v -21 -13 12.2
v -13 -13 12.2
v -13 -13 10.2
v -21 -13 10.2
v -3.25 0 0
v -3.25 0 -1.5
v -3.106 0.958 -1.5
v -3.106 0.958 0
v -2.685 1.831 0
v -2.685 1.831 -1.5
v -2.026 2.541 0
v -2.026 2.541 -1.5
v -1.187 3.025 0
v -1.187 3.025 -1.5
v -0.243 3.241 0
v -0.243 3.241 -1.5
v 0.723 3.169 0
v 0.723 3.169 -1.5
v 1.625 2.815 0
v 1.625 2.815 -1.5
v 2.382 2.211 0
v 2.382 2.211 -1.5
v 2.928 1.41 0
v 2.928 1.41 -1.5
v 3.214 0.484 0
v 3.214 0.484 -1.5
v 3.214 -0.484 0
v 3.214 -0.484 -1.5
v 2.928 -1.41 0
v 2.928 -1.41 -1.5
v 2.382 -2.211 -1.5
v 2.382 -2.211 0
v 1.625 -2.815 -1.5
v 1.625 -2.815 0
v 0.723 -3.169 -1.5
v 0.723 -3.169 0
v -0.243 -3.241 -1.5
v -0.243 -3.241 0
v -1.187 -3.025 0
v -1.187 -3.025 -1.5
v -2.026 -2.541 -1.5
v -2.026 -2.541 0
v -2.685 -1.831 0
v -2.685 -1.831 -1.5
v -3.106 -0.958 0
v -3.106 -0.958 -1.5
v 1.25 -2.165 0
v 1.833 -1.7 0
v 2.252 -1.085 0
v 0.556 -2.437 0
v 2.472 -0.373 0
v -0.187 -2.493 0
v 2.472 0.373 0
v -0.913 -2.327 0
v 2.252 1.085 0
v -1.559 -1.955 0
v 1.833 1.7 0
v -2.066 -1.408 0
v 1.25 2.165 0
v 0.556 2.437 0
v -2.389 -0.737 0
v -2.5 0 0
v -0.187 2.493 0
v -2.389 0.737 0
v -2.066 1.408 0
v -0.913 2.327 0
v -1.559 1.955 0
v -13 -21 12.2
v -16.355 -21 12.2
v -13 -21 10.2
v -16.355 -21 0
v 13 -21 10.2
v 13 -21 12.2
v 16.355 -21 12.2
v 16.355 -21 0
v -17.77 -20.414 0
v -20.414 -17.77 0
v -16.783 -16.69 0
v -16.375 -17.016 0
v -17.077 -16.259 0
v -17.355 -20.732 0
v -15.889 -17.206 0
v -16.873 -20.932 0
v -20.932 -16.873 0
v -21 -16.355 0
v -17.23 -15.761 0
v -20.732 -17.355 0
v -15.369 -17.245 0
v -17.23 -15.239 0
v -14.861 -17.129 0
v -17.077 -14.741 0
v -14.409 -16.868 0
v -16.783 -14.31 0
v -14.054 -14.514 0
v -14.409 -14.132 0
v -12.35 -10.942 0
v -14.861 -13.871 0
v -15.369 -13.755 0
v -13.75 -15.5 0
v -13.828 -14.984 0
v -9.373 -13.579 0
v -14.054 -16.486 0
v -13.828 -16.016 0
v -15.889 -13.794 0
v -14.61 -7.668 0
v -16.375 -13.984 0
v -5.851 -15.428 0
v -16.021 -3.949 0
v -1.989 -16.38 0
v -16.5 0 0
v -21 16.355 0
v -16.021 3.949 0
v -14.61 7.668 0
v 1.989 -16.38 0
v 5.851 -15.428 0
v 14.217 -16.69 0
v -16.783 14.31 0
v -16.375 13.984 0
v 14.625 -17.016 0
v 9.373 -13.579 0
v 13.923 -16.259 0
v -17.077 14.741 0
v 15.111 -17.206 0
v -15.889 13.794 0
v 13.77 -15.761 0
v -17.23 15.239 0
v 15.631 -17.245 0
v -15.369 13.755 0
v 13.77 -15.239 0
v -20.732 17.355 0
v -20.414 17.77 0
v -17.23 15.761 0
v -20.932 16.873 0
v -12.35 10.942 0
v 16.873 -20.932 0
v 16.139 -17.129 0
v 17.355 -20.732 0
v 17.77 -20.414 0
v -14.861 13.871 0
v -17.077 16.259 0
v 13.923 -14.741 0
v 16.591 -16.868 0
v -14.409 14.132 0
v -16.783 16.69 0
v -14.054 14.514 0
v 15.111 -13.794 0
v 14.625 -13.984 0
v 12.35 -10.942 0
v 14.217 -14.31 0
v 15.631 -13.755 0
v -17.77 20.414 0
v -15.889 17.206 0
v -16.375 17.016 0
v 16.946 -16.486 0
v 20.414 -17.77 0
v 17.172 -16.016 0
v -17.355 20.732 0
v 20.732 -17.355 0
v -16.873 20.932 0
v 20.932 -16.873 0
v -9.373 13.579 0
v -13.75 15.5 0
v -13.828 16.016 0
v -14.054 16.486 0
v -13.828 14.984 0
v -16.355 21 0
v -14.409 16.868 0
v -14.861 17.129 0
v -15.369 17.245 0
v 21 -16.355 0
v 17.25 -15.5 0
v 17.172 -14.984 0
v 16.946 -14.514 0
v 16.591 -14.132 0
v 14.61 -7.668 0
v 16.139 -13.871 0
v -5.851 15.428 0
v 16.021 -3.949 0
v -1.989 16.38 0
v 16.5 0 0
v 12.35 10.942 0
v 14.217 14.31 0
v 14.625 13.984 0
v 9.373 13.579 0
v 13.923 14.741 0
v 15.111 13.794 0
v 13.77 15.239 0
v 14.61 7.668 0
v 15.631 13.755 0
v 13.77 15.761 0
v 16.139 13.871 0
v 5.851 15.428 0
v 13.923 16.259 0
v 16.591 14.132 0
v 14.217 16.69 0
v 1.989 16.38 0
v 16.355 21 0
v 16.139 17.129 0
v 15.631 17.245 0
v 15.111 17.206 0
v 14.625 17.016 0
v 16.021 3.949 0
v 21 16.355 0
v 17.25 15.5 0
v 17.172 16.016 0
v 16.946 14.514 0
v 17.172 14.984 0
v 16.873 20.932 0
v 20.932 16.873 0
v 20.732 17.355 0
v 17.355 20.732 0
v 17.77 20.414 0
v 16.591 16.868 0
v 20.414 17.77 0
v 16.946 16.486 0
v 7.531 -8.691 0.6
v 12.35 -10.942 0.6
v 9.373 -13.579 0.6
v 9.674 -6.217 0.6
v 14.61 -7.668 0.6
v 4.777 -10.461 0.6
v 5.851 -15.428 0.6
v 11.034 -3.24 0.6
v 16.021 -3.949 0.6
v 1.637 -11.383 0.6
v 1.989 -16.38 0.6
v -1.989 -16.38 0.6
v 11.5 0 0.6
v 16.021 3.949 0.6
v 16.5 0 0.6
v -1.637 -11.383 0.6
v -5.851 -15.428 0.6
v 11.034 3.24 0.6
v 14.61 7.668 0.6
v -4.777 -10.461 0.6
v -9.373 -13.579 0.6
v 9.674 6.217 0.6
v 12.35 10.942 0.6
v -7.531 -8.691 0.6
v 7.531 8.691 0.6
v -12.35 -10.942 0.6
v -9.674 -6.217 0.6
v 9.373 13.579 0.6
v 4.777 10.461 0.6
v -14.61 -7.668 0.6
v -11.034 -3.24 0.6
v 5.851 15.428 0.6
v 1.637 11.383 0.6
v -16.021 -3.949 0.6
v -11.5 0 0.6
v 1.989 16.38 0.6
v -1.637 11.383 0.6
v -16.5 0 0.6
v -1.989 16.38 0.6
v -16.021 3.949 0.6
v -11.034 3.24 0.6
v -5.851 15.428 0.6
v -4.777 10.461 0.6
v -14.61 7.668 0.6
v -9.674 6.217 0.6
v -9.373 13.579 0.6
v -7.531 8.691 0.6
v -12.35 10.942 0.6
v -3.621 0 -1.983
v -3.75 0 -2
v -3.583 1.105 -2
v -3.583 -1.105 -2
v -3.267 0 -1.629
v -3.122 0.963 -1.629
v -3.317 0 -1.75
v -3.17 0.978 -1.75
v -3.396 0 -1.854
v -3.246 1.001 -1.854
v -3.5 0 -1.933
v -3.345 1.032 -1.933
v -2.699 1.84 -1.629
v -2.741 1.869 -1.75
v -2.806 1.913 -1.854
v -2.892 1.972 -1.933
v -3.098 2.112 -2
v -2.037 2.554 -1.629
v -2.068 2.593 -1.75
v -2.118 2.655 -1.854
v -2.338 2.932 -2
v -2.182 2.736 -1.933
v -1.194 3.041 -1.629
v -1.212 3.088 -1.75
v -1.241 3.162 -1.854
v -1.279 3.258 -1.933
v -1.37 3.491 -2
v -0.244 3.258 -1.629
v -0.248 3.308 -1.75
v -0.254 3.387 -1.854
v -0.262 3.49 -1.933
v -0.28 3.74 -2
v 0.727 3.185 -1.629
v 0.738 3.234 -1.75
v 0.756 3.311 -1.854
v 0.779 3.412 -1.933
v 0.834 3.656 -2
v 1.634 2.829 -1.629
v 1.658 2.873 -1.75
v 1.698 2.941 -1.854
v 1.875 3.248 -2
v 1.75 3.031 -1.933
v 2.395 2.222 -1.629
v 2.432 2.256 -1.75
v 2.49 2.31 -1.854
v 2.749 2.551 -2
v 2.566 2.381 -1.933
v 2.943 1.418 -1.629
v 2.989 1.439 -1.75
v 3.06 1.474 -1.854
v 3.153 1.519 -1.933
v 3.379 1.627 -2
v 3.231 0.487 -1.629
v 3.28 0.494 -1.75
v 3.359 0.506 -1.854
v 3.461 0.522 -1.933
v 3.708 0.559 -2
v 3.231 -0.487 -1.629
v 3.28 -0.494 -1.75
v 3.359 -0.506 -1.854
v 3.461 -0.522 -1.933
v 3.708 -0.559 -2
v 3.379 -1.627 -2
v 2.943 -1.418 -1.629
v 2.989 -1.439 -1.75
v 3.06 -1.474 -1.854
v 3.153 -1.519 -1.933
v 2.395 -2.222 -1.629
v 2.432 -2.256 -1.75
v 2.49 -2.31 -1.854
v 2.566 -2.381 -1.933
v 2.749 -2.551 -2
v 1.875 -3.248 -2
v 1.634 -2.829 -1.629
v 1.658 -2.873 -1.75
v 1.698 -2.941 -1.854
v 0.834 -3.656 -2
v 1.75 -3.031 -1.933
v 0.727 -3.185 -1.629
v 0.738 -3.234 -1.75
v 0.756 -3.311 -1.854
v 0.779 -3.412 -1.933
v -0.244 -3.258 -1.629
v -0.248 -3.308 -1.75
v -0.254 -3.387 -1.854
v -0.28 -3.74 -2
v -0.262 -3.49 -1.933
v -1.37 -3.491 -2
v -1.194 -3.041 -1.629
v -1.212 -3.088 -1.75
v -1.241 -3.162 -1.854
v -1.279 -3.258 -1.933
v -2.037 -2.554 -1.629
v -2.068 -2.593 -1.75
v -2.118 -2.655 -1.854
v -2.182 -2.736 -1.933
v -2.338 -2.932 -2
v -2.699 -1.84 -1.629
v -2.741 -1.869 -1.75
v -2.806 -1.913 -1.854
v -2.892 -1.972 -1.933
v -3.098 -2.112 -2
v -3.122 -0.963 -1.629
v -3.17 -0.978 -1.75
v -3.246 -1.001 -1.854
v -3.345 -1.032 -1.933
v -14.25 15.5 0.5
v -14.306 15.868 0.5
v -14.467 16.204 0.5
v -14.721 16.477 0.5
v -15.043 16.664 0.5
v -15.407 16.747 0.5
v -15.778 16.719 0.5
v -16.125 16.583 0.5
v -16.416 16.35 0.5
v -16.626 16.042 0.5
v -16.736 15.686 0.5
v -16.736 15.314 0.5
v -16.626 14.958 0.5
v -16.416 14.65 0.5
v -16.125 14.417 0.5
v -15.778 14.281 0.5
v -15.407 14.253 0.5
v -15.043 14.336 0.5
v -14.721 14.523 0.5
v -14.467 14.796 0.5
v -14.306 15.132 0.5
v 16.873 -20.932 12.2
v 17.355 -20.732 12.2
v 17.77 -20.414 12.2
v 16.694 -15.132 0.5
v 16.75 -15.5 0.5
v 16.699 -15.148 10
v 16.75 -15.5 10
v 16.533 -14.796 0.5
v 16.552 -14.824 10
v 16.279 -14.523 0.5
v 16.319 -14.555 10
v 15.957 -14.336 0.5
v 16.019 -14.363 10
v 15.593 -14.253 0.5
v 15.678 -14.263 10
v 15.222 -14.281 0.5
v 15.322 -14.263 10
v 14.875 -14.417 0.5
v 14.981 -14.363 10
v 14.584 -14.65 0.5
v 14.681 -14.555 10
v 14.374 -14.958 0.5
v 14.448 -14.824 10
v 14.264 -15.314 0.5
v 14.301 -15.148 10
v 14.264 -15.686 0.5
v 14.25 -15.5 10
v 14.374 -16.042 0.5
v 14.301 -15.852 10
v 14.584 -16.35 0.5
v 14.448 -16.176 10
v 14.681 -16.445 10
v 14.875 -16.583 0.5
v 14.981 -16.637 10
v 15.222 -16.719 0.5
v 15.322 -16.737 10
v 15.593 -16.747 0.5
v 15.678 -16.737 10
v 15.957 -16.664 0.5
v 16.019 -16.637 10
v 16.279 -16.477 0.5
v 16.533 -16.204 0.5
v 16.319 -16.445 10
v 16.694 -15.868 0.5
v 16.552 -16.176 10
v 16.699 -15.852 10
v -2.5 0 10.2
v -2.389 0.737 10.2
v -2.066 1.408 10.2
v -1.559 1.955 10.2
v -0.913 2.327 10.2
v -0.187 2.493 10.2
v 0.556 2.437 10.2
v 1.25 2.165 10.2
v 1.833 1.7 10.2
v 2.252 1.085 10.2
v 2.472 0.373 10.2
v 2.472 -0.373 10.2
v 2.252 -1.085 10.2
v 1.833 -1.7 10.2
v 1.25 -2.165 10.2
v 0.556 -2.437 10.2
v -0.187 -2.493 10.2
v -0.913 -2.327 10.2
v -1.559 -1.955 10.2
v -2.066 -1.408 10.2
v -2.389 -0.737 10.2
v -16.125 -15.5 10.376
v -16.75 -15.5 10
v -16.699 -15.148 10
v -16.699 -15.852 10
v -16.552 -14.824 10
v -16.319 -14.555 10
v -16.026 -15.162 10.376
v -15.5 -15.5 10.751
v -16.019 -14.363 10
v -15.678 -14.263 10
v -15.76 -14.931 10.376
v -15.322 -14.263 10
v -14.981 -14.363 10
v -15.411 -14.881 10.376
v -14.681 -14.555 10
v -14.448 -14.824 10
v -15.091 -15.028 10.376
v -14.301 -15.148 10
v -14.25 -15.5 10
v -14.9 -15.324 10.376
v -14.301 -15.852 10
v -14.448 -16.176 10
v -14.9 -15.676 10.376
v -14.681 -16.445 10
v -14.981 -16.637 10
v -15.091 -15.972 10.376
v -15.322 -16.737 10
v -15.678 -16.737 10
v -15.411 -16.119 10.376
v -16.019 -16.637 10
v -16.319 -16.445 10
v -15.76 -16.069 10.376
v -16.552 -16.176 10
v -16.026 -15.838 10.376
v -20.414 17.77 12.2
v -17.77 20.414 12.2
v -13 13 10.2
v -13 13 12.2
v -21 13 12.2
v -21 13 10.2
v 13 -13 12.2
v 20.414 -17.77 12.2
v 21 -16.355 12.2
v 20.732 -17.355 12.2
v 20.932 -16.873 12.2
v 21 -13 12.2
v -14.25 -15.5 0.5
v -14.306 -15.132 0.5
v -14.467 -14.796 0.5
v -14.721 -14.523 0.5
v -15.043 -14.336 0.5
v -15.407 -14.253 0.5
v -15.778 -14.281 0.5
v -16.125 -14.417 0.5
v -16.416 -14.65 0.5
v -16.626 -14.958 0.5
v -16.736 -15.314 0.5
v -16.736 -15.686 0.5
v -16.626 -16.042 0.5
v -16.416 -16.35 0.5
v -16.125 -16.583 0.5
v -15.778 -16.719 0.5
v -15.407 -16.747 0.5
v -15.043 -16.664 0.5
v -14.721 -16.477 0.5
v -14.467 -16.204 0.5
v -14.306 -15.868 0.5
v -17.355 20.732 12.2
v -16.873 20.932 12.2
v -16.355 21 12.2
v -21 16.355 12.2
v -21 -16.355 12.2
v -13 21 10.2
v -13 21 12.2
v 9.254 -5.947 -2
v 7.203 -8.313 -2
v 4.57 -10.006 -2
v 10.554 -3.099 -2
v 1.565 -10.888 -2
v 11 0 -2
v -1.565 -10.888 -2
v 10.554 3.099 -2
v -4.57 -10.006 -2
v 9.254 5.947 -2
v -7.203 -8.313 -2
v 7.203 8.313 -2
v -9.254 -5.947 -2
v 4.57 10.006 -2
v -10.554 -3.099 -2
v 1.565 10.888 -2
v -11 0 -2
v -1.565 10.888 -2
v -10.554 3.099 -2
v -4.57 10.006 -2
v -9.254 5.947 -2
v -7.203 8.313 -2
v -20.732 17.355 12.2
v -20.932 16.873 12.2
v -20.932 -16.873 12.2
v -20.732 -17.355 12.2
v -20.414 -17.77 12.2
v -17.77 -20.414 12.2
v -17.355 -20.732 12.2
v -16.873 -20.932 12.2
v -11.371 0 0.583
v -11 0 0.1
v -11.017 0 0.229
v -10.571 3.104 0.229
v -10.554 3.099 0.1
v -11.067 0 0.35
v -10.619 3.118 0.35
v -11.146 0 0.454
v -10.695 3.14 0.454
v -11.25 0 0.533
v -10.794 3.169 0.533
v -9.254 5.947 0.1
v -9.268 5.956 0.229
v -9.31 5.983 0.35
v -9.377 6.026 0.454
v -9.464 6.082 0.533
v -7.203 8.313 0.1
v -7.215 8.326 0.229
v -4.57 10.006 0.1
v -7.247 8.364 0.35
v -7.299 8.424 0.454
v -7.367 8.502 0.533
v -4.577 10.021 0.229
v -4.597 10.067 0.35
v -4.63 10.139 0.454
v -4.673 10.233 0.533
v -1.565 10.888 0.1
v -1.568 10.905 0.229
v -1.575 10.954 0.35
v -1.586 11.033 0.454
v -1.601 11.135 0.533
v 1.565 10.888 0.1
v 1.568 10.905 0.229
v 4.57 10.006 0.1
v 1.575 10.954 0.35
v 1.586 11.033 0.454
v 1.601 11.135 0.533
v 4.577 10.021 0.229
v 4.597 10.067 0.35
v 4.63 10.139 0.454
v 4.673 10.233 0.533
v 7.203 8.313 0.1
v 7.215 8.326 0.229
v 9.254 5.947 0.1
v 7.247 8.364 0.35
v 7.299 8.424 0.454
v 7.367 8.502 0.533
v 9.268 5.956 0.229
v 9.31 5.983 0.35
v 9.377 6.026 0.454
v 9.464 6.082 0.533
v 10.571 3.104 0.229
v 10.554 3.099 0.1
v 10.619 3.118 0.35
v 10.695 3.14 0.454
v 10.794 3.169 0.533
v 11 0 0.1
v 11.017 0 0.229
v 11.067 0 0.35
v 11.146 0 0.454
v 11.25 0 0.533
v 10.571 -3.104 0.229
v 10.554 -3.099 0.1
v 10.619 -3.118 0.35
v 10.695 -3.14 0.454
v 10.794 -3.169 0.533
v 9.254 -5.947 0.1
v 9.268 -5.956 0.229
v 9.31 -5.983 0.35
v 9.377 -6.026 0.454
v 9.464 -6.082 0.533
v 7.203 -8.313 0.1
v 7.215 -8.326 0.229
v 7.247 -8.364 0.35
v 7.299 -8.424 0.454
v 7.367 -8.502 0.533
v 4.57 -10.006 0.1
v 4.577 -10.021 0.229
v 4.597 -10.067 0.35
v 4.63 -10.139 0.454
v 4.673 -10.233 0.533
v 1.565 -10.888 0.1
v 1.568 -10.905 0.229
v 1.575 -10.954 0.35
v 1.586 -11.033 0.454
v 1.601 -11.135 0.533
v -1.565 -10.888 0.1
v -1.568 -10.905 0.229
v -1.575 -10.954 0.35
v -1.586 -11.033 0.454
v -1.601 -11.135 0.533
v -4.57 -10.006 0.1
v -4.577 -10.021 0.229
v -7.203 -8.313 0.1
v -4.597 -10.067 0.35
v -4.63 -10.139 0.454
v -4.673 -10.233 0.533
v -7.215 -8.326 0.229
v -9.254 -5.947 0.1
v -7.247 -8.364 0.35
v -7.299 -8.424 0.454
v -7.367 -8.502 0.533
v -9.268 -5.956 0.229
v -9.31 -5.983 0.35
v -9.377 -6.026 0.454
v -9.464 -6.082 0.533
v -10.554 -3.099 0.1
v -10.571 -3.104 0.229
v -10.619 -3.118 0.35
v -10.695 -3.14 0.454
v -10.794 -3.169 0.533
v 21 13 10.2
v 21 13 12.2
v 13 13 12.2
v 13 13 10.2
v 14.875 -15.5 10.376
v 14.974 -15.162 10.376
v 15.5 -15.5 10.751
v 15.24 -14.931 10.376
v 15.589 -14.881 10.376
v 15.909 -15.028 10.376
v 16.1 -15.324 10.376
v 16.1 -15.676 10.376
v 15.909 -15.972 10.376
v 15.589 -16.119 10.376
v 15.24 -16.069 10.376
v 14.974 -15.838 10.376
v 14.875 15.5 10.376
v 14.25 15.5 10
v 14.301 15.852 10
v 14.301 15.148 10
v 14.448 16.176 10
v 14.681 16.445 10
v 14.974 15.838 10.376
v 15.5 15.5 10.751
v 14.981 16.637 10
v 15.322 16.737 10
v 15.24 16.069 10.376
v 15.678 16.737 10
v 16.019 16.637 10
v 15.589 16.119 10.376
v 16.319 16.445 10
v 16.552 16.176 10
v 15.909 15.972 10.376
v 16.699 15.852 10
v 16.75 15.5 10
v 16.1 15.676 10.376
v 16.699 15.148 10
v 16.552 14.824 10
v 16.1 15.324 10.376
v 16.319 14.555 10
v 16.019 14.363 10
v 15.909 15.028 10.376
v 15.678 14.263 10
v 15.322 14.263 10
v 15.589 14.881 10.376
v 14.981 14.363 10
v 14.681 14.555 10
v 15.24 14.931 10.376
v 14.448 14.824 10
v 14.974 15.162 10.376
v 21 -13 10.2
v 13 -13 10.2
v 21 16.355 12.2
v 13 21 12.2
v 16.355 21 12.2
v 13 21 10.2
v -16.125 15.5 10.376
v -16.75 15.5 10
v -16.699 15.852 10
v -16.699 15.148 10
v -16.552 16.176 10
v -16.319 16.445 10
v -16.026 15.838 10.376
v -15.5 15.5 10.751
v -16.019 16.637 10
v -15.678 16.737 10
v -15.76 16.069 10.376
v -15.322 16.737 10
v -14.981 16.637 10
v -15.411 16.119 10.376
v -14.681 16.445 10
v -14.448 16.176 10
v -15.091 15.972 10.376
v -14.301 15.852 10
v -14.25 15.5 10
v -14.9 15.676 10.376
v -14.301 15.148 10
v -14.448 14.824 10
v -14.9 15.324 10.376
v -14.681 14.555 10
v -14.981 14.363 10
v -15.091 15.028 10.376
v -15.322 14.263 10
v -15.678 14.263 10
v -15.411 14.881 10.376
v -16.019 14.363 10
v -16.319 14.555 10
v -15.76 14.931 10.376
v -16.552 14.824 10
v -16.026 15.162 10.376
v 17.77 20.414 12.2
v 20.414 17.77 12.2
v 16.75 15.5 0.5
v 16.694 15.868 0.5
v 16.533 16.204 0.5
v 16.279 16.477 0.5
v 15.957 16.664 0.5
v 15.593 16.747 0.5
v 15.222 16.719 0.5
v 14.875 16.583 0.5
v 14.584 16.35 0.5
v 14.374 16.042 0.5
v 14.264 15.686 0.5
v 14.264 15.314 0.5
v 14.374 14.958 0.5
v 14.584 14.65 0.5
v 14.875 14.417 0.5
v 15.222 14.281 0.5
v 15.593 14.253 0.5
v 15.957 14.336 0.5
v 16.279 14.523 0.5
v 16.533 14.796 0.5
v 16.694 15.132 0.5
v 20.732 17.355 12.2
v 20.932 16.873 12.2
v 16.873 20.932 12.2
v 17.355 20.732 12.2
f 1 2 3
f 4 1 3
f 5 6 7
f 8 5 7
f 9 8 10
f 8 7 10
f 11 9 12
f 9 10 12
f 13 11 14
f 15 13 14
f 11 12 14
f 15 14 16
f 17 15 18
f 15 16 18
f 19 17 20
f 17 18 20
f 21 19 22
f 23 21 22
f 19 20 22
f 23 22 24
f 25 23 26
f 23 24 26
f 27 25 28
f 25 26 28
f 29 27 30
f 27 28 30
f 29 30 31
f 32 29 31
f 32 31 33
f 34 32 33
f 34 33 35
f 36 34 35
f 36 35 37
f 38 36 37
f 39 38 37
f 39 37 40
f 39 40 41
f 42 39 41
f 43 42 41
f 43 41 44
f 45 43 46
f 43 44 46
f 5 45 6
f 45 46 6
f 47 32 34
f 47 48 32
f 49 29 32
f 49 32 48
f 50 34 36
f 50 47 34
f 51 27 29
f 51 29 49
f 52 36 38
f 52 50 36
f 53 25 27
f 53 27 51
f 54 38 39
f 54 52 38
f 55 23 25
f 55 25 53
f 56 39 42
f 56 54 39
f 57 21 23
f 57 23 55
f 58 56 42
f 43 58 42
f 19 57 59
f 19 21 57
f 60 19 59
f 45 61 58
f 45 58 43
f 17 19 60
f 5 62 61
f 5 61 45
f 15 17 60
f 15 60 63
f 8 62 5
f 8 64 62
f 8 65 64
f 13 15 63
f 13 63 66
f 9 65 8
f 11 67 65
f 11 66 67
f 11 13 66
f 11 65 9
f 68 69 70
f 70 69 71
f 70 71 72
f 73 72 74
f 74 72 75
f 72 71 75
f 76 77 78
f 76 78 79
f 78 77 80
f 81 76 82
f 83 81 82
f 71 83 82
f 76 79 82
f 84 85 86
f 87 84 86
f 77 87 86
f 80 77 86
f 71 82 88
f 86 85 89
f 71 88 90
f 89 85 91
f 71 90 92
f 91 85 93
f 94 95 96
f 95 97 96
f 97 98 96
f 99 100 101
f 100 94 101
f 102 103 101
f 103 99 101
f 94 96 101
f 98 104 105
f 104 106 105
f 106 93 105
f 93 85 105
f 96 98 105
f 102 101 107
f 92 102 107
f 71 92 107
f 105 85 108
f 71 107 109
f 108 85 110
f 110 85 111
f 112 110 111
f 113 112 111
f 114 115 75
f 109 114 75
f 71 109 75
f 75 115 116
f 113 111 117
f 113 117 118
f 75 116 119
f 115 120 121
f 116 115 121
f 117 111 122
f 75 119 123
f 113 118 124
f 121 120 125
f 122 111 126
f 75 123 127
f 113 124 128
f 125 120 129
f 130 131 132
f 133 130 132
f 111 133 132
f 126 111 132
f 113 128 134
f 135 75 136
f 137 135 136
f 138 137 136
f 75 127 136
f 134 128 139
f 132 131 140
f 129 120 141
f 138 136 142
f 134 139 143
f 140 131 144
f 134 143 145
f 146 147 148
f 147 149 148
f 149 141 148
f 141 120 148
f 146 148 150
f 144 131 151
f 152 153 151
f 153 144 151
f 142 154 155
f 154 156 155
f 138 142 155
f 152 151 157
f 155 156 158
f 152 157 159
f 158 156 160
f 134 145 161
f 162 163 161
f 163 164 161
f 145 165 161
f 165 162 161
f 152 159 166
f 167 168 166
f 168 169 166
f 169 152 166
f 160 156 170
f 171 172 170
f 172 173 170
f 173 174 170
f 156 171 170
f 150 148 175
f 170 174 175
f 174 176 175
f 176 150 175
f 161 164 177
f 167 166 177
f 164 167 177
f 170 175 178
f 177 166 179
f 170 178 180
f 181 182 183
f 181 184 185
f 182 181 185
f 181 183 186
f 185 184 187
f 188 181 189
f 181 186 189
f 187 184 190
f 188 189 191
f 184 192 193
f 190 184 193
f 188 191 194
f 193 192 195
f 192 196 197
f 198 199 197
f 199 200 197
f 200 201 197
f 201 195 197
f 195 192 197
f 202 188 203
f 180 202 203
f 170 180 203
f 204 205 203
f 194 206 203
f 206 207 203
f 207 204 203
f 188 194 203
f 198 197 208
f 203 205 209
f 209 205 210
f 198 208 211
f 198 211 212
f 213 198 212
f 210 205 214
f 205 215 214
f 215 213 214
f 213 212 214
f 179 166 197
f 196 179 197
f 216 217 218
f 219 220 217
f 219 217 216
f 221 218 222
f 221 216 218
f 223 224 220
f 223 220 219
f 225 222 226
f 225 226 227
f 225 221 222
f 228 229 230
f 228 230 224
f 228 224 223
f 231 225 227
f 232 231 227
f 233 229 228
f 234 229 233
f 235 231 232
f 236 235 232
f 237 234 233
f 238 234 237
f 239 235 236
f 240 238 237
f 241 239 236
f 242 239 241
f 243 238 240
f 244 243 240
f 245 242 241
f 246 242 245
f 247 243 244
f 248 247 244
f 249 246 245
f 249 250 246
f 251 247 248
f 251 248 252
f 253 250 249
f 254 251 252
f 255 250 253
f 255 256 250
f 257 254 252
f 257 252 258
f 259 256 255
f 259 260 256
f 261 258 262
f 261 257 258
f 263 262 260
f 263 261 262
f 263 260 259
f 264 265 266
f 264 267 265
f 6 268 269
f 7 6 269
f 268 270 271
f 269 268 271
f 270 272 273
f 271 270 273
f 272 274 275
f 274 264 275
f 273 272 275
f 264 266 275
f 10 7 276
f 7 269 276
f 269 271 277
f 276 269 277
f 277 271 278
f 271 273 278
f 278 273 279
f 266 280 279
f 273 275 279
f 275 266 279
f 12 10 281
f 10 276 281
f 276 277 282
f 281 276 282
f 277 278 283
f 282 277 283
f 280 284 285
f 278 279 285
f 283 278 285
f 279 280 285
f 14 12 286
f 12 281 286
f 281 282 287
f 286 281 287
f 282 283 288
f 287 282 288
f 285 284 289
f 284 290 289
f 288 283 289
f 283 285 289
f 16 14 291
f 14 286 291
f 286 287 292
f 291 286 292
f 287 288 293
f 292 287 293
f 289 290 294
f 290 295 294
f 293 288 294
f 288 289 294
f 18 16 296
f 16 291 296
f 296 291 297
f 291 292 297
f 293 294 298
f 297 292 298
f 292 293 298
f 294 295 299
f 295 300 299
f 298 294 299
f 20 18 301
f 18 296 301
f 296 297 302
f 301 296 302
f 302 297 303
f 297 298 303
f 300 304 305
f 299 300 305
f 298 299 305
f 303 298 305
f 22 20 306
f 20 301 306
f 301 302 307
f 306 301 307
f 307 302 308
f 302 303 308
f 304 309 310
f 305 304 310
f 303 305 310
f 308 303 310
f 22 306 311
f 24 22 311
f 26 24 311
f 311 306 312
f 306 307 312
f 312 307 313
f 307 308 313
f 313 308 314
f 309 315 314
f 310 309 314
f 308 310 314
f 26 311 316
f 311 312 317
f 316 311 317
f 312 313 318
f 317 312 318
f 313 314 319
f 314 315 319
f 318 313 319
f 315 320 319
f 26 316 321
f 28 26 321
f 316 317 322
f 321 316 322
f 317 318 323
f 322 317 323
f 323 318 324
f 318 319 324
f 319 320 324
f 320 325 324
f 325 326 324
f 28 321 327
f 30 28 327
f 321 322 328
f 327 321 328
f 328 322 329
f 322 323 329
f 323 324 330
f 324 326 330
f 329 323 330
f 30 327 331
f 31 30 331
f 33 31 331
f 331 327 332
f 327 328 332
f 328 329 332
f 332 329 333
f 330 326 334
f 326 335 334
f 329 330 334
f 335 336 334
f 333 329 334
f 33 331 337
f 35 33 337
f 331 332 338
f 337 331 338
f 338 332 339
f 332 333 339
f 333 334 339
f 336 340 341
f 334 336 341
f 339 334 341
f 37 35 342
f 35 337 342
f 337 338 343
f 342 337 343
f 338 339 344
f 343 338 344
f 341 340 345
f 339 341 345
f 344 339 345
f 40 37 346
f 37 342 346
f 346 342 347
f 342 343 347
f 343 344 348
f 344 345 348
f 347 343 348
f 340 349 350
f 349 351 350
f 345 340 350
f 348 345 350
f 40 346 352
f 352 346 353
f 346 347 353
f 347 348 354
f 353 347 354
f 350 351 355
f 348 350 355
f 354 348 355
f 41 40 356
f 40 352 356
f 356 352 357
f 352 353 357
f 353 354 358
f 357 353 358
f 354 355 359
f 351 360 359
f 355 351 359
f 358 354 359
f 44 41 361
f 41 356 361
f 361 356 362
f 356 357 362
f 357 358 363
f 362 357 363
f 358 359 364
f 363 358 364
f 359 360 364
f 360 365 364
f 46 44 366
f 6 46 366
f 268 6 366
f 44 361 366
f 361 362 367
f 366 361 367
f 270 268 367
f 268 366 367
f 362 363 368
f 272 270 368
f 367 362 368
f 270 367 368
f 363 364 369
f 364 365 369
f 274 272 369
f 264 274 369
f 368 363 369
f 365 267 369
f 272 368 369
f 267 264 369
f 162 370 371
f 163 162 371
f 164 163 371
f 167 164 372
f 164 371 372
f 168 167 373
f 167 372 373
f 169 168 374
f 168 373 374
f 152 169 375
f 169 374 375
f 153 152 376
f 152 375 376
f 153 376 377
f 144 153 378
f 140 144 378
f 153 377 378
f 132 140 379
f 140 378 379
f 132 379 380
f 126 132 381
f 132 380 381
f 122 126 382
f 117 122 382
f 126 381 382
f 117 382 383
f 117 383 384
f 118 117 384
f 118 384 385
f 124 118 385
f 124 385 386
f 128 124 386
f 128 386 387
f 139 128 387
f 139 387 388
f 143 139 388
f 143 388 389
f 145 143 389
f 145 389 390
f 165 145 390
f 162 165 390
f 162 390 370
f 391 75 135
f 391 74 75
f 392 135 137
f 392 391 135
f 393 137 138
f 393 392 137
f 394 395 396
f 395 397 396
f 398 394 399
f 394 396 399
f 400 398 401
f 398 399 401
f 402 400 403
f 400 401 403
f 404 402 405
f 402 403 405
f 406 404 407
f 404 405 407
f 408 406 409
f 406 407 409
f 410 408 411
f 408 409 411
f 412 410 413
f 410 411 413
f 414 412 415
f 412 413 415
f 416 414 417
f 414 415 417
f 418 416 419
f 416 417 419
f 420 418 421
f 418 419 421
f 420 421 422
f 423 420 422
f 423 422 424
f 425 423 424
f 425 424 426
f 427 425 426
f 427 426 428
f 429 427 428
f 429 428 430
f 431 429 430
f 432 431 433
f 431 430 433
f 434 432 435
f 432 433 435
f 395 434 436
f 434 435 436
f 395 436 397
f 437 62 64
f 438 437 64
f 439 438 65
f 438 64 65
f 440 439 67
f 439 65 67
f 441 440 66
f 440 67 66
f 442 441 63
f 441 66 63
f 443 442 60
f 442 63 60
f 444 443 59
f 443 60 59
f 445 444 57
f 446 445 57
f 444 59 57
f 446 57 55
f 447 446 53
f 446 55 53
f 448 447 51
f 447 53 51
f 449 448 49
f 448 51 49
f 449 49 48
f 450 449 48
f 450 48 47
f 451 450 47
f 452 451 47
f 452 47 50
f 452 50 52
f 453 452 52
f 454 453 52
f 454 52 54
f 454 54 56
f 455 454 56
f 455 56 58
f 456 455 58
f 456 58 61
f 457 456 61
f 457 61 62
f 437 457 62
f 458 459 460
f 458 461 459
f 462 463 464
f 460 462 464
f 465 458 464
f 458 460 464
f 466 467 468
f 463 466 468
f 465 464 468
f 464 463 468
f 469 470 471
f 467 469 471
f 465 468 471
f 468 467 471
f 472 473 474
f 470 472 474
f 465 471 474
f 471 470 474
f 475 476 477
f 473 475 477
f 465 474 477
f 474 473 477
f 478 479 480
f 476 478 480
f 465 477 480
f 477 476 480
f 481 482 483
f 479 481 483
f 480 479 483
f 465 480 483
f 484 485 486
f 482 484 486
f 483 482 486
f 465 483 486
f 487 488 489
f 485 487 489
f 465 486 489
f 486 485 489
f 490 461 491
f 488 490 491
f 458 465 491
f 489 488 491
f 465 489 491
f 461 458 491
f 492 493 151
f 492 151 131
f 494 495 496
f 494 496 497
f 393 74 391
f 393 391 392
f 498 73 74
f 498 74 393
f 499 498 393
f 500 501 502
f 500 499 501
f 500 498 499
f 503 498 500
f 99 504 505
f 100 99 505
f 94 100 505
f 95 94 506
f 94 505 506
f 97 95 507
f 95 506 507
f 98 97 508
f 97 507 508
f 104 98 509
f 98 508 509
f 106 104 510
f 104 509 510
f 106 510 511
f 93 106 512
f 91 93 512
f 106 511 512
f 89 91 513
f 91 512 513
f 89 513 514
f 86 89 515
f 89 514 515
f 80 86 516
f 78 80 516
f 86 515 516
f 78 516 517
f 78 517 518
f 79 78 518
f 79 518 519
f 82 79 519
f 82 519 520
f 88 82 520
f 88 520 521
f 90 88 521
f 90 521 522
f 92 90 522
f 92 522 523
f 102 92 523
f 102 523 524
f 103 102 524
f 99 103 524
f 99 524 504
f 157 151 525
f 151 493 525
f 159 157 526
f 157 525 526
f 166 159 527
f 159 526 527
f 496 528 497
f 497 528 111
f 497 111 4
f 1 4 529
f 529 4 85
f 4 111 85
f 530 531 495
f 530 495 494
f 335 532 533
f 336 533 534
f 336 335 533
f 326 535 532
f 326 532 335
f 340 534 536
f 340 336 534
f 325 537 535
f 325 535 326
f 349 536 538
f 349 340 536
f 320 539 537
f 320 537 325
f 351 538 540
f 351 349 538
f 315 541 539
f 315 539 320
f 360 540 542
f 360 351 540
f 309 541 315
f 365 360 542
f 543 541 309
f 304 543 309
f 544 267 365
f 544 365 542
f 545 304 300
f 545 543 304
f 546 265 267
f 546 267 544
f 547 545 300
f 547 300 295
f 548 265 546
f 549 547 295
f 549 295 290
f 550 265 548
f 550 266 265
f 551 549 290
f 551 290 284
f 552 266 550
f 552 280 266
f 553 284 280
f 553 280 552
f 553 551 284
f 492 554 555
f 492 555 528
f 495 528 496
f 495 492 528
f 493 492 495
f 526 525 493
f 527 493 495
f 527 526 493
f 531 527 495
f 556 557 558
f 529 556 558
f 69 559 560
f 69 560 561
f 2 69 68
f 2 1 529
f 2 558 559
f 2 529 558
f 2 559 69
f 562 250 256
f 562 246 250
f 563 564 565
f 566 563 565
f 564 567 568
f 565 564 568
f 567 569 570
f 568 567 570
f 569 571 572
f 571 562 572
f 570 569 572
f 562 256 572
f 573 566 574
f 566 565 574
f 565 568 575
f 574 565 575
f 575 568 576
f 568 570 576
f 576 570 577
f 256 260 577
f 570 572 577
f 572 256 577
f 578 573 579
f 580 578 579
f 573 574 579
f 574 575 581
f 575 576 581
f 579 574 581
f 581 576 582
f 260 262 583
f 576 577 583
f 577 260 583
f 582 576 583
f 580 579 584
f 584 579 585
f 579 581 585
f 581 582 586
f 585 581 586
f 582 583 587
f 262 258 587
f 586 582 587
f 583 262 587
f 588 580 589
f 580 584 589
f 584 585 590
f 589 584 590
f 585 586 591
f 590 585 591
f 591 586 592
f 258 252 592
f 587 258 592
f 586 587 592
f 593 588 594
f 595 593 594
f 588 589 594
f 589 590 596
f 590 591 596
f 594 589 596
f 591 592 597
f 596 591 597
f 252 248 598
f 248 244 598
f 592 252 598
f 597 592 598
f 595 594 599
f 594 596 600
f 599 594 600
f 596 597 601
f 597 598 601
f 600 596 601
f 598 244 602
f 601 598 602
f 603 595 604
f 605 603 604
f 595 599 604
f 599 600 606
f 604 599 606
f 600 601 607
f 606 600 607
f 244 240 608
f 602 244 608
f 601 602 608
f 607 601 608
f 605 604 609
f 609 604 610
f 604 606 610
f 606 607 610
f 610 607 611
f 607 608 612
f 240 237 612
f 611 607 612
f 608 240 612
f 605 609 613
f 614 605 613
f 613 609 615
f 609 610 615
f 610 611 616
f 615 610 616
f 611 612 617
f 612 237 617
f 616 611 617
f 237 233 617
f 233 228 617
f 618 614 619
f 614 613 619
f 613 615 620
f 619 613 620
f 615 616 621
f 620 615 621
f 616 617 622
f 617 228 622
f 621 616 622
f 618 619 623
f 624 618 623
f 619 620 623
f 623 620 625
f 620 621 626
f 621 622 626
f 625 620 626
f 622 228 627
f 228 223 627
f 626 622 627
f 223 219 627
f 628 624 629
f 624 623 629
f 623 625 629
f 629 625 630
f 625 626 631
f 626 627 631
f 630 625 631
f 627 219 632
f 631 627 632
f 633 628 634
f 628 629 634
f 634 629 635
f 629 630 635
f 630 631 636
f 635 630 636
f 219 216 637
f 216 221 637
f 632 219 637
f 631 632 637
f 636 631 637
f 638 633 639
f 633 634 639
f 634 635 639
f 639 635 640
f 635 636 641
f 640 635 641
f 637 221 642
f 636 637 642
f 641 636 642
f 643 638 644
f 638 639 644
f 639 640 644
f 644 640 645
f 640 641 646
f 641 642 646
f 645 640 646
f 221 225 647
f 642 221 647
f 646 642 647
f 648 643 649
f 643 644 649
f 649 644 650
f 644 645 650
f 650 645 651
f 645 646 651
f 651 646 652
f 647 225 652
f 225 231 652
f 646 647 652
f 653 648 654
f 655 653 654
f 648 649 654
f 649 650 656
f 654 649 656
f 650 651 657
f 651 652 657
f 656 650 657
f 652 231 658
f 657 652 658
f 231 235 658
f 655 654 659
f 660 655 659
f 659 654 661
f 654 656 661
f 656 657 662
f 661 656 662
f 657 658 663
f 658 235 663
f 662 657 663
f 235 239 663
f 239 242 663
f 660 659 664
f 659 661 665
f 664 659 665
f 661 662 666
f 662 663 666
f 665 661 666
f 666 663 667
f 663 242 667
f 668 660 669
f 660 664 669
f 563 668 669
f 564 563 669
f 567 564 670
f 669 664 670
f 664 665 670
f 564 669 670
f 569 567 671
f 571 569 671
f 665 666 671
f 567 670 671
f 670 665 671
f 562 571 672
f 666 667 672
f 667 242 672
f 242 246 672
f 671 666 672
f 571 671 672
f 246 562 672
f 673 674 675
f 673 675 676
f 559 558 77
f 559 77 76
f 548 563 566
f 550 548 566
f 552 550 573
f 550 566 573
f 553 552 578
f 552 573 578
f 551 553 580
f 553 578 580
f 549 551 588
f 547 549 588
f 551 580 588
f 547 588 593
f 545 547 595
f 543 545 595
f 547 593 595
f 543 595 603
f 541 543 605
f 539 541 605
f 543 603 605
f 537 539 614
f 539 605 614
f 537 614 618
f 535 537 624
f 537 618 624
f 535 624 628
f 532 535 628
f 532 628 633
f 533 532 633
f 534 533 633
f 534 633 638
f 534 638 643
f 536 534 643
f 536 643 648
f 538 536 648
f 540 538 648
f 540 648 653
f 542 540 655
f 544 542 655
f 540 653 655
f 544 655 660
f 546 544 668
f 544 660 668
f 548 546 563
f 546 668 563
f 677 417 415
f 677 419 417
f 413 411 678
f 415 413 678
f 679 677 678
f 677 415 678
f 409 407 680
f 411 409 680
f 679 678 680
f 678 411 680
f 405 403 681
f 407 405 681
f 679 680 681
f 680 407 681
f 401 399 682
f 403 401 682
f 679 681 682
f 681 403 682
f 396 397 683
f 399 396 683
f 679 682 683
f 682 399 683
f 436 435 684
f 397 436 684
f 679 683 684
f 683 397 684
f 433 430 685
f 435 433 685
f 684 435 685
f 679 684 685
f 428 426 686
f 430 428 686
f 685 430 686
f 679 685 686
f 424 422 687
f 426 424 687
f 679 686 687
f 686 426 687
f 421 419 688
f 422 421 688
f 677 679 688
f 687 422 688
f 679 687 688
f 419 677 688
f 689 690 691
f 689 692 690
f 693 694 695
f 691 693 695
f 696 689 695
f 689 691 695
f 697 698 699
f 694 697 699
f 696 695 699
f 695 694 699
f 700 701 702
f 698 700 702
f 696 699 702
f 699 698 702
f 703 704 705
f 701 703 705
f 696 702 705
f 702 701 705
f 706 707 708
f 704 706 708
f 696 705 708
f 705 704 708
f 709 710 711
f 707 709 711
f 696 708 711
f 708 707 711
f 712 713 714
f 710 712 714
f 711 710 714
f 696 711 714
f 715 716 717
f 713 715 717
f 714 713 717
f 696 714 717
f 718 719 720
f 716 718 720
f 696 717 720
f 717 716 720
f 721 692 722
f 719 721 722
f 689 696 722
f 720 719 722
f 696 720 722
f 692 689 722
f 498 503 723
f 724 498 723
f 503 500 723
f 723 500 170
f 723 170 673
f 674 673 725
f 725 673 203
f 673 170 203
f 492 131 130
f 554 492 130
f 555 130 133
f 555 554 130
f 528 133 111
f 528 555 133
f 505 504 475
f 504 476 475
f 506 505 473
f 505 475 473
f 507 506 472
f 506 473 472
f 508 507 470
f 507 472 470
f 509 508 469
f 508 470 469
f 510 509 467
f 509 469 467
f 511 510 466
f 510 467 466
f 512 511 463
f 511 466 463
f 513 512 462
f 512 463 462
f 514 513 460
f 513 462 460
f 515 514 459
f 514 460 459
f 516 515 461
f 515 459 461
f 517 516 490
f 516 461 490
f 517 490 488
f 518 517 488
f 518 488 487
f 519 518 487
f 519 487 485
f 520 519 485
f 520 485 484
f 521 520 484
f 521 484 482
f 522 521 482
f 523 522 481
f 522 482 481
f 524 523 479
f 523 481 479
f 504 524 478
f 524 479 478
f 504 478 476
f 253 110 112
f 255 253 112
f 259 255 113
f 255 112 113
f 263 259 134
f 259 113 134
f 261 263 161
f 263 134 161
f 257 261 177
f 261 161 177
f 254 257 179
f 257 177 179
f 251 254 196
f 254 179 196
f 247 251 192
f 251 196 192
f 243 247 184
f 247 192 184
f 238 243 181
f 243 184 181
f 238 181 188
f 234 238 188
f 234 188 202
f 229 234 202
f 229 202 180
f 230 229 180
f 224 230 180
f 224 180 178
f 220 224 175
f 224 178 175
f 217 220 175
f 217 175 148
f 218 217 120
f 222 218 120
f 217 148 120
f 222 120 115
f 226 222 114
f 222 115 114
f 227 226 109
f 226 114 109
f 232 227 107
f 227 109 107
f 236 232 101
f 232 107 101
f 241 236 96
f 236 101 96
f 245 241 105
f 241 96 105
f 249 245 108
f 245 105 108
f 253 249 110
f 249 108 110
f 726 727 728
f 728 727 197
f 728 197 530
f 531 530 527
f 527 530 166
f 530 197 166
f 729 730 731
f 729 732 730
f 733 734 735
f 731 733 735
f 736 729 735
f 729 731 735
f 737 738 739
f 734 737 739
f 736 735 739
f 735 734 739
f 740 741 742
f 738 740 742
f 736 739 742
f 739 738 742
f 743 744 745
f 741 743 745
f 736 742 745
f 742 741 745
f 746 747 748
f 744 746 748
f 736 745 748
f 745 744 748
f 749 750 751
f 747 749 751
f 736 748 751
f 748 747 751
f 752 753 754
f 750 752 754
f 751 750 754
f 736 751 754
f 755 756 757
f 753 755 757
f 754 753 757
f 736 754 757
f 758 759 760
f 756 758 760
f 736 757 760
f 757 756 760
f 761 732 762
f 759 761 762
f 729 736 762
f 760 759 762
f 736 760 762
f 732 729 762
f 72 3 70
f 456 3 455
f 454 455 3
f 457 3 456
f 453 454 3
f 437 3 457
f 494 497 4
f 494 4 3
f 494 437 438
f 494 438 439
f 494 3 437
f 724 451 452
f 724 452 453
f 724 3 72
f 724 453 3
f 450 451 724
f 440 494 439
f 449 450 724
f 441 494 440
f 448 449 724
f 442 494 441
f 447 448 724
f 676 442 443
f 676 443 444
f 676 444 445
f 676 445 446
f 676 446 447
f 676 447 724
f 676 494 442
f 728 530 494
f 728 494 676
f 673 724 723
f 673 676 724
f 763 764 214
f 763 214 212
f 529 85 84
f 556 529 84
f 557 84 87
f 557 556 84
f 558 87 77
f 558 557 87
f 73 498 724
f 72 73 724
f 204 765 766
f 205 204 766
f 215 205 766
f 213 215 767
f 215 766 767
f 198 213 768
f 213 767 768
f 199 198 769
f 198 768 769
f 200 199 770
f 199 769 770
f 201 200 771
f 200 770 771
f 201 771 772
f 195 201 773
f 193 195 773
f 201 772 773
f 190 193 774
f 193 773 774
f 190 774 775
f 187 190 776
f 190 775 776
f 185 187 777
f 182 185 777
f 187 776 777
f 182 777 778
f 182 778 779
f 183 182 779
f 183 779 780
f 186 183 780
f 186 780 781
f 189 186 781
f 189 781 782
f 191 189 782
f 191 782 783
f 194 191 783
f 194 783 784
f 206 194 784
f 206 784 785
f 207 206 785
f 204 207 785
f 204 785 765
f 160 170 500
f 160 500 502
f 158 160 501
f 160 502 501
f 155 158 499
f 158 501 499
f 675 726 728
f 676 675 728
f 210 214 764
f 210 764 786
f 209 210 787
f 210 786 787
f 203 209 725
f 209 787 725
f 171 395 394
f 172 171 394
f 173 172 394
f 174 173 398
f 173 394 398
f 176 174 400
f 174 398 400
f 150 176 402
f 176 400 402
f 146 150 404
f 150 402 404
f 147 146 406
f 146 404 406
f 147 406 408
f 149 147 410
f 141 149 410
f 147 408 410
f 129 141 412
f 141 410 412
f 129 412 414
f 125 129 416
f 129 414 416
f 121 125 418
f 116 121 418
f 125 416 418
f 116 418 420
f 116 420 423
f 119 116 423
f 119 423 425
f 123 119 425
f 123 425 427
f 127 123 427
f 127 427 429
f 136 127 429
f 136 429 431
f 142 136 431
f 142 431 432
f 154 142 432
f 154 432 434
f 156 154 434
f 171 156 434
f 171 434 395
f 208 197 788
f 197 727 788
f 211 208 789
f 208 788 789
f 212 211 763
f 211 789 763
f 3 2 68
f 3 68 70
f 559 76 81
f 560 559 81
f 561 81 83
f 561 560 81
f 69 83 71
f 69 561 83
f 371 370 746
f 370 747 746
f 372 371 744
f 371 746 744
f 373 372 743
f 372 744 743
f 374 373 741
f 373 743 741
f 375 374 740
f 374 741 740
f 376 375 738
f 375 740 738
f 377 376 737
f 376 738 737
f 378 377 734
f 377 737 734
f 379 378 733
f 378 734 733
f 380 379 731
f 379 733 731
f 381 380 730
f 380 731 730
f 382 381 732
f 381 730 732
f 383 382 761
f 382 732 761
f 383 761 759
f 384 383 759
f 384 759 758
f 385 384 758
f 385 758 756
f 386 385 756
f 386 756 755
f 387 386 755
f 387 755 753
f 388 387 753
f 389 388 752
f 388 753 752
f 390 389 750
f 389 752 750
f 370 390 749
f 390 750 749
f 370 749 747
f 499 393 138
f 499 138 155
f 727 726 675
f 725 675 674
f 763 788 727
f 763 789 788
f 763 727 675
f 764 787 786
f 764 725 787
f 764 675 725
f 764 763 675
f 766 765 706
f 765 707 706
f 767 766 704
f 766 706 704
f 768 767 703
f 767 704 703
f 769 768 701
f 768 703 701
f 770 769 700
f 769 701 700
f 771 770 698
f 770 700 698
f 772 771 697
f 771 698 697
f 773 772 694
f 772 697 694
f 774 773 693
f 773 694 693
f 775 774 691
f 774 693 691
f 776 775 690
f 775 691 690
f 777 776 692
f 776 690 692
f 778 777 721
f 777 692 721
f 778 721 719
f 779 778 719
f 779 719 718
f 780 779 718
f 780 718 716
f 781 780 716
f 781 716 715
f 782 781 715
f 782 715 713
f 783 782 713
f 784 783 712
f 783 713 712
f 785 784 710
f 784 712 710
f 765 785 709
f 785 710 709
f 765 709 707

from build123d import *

# Parameters (mm, degrees)
BOSS_EXTRUDE1_DEPTH             = 12.2
SKETCH2_W                       = 2
SKETCH2_H                       = 26
CUT_EXTRUDE1_DEPTH              = 49.516388984
SKETCH3_W                       = 26
SKETCH3_H                       = 2
CUT_EXTRUDE2_DEPTH              = 49.516388984
SKETCH4_R                       = 16.5
CUT_EXTRUDE3_DEPTH              = 0.6
SKETCH5_R                       = 11
BOSS_EXTRUDE2_DEPTH             = 2.6
SKETCH6_R                       = 3.25
CUT_EXTRUDE4_DEPTH              = 2
SKETCH7_R                       = 2.5
CUT_EXTRUDE5_DEPTH              = 33.106697121
FILLET1_R                       = 0.5
FILLET3_R                       = 0.5
FILLET4_R                       = 2
M3X0_5_TAPPED_HOLE1_D           = 2.5
M3X0_5_TAPPED_HOLE1_DEPTH       = 10
M3X0_5_TAPPED_HOLE1_CSINK_D     = 3.5
M3X0_5_TAPPED_HOLE1_CSINK_ANGLE = 90
M3X0_5_TAPPED_HOLE1_TIP         = 0.751075774


with BuildPart() as part:
    # Sketch1 → Boss-Extrude1 (new body)
    with BuildSketch(Plane.XY):
        Polygon((-17.183766184, 21), (-21, 17.183766184), (-21, -17.183766184), (-17.183766184, -21), (17.183766184, -21), (21, -17.183766184), (21, 17.183766184), (17.183766184, 21), align=None)
    extrude(amount=BOSS_EXTRUDE1_DEPTH)

    # Sketch2 → Cut-Extrude1 (cut, through all)
    with BuildSketch(Plane(origin=(21, 0, 0), x_dir=(0, 0, -1), z_dir=(1, 0, 0))):
        with Locations((-11.2, 0)):
            Rectangle(SKETCH2_W, SKETCH2_H)
    extrude(amount=-CUT_EXTRUDE1_DEPTH, mode=Mode.SUBTRACT)

    # Sketch3 → Cut-Extrude2 (cut, through all)
    with BuildSketch(Plane(origin=(0, 21, 0), x_dir=(1, 0, 0), z_dir=(0, 1, 0))):
        with Locations((0, -11.2)):
            Rectangle(SKETCH3_W, SKETCH3_H)
    extrude(amount=-CUT_EXTRUDE2_DEPTH, mode=Mode.SUBTRACT)

    # Sketch4 → Cut-Extrude3 (cut)
    with BuildSketch(Plane(origin=(0, 0, 0), x_dir=(-1, 0, 0), z_dir=(0, 0, -1))):
        Circle(SKETCH4_R)
    extrude(amount=-CUT_EXTRUDE3_DEPTH, mode=Mode.SUBTRACT)

    # Sketch5 → Boss-Extrude2 (add)
    with BuildSketch(Plane(origin=(0, 0, 0.6), x_dir=(-1, 0, 0), z_dir=(0, 0, -1))):
        Circle(SKETCH5_R)
    extrude(amount=BOSS_EXTRUDE2_DEPTH)

    # Sketch6 → Cut-Extrude4 (cut)
    with BuildSketch(Plane(origin=(0, 0, -2), x_dir=(-1, 0, 0), z_dir=(0, 0, -1))):
        Circle(SKETCH6_R)
    extrude(amount=-CUT_EXTRUDE4_DEPTH, mode=Mode.SUBTRACT)

    # Sketch7 → Cut-Extrude5 (cut, through all)
    with BuildSketch(Plane(origin=(0, 0, 0), x_dir=(-1, 0, 0), z_dir=(0, 0, -1))):
        Circle(SKETCH7_R)
    extrude(amount=-CUT_EXTRUDE5_DEPTH, mode=Mode.SUBTRACT)

    # Fillet1
    fillet1_edges = [part.edges().sort_by_distance(p)[0] for p in [
        (3.25, 0, -2),
    ]]
    fillet(fillet1_edges, radius=FILLET1_R)

    # Fillet3
    fillet3_edges = [part.edges().sort_by_distance(p)[0] for p in [
        (11, 0, 0.6),
    ]]
    fillet(fillet3_edges, radius=FILLET3_R)

    # Fillet4
    fillet4_edges = [part.edges().sort_by_distance(p)[0] for p in [
        (17.183766184, 21, 6.1),
        (21, 17.183766184, 6.1),
        (21, -17.183766184, 6.1),
        (17.183766184, -21, 6.1),
        (-17.183766184, -21, 6.1),
        (-21, -17.183766184, 6.1),
        (-21, 17.183766184, 6.1),
        (-17.183766184, 21, 6.1),
    ]]
    fillet(fillet4_edges, radius=FILLET4_R)

    # M3x0.5 Tapped Hole1
    with Locations(Plane(origin=(0, 0, 0), x_dir=(-1, 0, 0), z_dir=(0, 0, -1))):
        with Locations((-15.5, -15.5), (-15.5, 15.5), (15.5, 15.5), (15.5, -15.5)):
            CounterSinkHole(M3X0_5_TAPPED_HOLE1_D / 2, M3X0_5_TAPPED_HOLE1_CSINK_D / 2, depth=M3X0_5_TAPPED_HOLE1_DEPTH, counter_sink_angle=M3X0_5_TAPPED_HOLE1_CSINK_ANGLE)
            with Locations((0, 0, -(M3X0_5_TAPPED_HOLE1_DEPTH + M3X0_5_TAPPED_HOLE1_TIP / 2))):  # 118° drill point
                Cone(0, M3X0_5_TAPPED_HOLE1_D / 2, M3X0_5_TAPPED_HOLE1_TIP, mode=Mode.SUBTRACT)


solid = part.part
